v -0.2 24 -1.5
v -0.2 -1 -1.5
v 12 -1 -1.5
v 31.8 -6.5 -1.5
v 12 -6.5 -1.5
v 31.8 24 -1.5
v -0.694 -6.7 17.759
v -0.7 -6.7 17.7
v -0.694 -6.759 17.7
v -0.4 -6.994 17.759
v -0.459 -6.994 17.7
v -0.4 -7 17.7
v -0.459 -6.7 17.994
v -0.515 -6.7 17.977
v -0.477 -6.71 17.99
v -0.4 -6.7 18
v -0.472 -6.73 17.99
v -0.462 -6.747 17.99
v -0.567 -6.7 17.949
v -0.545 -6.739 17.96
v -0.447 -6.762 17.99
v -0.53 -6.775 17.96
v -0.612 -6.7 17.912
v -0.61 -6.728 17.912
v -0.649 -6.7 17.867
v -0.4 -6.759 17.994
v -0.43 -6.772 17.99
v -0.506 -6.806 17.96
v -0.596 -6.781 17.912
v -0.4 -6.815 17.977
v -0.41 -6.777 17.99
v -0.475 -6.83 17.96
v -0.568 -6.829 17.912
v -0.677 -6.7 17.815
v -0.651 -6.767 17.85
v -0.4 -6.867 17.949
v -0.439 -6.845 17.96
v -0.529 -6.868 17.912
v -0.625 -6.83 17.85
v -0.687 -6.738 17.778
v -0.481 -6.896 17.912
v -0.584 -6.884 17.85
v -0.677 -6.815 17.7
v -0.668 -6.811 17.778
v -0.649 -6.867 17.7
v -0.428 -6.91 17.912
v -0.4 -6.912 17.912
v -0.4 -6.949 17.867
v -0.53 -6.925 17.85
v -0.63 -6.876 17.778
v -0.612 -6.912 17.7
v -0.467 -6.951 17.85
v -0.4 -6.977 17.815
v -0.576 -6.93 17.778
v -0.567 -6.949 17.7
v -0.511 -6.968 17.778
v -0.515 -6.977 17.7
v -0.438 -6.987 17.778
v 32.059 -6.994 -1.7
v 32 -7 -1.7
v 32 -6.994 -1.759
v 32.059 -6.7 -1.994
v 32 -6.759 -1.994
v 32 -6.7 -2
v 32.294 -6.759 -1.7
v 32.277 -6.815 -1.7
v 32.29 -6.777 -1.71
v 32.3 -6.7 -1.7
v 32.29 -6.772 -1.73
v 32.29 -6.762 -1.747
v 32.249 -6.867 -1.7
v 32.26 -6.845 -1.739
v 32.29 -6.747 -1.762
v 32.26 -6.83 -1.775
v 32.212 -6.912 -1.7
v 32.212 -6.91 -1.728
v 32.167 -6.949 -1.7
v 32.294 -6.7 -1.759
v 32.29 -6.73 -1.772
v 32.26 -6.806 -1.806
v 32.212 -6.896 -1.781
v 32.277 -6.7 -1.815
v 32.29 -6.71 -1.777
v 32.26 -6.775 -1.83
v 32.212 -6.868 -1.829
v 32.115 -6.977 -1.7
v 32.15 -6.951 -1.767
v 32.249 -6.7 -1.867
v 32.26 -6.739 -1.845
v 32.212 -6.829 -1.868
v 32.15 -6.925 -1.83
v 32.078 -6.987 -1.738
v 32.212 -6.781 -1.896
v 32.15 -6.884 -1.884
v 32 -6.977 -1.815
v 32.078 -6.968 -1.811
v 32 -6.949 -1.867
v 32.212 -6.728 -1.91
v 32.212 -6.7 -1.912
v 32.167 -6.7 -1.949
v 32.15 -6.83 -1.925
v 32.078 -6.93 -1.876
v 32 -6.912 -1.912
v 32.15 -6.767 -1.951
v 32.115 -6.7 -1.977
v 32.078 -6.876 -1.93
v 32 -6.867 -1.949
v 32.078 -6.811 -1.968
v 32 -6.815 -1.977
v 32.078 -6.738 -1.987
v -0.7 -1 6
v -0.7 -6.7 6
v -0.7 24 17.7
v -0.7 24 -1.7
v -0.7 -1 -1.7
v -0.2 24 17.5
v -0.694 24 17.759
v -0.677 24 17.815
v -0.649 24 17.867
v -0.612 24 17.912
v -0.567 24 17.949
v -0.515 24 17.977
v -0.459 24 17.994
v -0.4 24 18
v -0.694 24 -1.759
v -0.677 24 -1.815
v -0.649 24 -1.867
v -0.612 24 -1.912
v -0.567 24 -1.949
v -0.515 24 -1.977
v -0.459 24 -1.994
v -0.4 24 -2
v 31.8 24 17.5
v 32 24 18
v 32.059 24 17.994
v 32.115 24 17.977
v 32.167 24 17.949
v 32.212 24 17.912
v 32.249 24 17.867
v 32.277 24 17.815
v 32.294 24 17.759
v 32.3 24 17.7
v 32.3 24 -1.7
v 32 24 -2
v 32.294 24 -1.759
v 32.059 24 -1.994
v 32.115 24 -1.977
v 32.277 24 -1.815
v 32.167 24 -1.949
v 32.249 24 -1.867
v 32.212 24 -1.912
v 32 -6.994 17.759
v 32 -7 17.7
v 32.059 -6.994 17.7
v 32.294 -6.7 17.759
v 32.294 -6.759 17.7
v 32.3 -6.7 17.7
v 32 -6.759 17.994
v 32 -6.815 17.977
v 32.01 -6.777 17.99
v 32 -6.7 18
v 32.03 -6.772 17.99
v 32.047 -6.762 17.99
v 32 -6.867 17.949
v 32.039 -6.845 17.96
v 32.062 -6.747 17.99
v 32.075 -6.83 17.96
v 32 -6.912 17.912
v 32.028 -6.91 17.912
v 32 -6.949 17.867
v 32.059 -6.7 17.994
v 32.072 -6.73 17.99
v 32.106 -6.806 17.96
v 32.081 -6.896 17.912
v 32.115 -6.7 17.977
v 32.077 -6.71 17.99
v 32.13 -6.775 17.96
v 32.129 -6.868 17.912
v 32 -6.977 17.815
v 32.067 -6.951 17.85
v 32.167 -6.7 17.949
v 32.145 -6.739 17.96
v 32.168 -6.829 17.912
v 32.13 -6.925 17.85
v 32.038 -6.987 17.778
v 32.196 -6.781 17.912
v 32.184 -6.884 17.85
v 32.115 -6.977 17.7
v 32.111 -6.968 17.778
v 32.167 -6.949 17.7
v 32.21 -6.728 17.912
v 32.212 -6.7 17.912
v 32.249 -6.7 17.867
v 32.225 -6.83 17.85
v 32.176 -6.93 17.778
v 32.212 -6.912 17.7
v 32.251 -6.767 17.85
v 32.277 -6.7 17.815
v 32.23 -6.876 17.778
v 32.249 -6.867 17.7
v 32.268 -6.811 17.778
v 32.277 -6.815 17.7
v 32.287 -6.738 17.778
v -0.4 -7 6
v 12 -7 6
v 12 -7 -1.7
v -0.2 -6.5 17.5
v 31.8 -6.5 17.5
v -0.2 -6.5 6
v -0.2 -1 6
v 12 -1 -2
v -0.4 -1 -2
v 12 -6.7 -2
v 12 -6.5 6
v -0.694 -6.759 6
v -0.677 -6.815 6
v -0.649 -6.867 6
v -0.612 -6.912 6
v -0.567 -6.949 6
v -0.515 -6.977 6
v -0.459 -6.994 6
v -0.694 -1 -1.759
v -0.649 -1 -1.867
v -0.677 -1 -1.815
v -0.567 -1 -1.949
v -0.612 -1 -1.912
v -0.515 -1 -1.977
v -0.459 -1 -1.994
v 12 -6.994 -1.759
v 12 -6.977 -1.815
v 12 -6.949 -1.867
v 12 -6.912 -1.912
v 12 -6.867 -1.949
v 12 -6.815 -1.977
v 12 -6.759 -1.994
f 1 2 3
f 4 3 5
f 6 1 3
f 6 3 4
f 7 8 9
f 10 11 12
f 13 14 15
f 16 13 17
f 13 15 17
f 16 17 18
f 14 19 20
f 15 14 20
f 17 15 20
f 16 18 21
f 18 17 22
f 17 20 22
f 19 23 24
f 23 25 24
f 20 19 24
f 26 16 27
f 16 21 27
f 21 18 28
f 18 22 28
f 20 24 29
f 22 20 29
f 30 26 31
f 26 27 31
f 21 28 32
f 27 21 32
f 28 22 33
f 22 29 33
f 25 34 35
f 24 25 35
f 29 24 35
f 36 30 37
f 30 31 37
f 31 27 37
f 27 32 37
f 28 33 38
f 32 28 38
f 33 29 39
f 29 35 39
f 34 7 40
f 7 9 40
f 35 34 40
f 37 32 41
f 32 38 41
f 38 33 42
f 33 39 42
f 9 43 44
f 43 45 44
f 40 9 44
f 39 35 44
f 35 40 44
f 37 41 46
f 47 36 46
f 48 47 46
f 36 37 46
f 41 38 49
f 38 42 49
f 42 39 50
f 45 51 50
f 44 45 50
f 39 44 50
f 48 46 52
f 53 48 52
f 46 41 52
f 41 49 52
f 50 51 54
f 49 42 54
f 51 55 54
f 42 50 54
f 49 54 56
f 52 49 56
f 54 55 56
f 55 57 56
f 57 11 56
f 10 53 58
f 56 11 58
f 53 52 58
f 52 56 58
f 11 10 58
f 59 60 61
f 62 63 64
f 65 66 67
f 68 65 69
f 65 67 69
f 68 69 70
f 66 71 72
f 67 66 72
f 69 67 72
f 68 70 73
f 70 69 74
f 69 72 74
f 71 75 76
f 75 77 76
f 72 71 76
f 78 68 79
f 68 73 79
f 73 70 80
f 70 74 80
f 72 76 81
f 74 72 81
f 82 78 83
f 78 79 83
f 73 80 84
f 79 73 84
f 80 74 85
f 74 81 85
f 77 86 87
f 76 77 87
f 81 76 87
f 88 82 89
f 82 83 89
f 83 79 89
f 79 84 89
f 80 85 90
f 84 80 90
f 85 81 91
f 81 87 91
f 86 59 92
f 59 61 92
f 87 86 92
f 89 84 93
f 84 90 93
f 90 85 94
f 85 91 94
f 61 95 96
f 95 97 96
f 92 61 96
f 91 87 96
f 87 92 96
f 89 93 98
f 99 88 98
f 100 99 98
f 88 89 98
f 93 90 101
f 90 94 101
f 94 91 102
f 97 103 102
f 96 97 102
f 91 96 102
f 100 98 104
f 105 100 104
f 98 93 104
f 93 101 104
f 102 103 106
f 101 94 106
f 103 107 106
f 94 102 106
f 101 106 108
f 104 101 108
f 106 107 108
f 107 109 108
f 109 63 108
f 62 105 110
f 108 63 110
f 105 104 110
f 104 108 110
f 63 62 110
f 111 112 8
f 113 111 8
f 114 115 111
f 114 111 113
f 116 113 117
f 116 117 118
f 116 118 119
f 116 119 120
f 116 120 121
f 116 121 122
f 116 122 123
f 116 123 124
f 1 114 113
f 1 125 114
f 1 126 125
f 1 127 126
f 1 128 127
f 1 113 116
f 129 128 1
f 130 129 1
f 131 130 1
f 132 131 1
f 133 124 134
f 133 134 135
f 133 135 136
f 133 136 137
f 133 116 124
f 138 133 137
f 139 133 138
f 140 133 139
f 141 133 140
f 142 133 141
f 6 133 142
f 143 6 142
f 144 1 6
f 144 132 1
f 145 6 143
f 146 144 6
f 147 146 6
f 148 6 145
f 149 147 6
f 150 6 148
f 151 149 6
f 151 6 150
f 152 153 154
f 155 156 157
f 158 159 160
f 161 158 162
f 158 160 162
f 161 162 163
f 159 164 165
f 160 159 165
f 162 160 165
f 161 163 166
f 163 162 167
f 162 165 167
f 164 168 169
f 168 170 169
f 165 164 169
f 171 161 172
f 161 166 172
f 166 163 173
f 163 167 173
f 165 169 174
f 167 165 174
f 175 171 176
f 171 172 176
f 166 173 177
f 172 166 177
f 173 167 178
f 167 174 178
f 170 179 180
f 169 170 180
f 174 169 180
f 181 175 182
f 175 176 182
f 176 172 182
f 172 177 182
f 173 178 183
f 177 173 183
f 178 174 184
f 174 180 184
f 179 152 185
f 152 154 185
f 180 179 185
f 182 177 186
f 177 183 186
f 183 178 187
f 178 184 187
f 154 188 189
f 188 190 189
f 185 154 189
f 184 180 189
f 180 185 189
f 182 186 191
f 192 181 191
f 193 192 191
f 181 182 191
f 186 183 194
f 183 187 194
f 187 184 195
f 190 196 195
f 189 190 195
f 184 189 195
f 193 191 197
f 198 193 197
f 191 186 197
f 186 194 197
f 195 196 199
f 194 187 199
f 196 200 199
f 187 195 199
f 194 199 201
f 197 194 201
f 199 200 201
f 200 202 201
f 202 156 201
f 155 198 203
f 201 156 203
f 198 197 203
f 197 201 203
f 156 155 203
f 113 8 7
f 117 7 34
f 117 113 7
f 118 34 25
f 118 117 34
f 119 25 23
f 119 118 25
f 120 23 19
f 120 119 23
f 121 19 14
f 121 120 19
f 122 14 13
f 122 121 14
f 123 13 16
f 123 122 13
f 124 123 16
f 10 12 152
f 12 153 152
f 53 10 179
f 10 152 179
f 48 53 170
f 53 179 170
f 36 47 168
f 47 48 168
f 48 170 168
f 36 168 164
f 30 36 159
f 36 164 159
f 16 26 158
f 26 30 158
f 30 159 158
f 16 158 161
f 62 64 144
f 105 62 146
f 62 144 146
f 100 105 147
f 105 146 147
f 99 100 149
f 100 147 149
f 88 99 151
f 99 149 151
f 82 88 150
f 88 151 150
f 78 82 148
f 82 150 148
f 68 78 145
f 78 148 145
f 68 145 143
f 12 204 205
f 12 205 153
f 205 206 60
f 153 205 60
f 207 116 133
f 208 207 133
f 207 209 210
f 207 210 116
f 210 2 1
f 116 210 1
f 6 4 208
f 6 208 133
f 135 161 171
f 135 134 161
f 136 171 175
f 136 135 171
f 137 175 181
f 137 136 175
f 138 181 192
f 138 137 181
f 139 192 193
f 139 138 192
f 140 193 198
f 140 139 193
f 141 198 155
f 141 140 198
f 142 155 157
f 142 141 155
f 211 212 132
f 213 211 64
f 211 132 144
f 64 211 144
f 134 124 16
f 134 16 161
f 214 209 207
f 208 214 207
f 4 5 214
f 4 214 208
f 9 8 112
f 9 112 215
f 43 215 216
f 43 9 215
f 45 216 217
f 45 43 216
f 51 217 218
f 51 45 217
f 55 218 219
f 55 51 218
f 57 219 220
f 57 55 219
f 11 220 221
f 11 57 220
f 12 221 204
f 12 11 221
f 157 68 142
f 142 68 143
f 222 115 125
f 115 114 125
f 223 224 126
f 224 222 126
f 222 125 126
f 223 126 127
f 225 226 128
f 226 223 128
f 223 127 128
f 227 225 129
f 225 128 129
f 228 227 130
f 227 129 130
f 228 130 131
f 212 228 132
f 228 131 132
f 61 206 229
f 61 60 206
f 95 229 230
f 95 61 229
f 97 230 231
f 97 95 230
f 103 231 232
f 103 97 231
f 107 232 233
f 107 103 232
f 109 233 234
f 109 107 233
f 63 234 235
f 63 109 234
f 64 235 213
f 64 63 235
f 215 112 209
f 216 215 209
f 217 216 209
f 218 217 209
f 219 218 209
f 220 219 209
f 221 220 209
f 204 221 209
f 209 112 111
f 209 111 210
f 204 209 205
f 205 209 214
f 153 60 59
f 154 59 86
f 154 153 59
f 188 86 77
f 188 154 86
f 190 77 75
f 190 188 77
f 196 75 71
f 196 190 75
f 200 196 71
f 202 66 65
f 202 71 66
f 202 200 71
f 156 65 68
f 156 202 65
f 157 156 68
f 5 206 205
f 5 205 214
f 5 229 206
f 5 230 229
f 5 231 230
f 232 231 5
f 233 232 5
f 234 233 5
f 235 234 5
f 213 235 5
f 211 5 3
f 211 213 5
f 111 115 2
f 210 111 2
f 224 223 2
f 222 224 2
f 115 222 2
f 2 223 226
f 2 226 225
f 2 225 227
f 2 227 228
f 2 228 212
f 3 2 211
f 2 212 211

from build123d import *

# Parameters (mm, degrees)
BOX012_W     = 14
BOX012_H     = 10
BOX012_DEPTH = 10
BOX011_W     = 32
BOX011_H     = 35
BOX011_DEPTH = 19
BOX010_W     = 33
BOX010_H     = 31
BOX010_DEPTH = 20
FILLET_R     = 0.3


with BuildPart() as cubo001:
    # Box012 → Box012 (new body)
    with BuildSketch(Plane(origin=(-2, -11, -4), x_dir=(1, 0, 0), z_dir=(0, 0, 1))):
        with Locations((7, 5)):
            Rectangle(BOX012_W, BOX012_H)
    extrude(amount=BOX012_DEPTH)


with BuildPart() as cubo:
    # Box011 → Box011 (new body)
    with BuildSketch(Plane(origin=(-0.2, -6.5, -1.5), x_dir=(1, 0, 0), z_dir=(0, 0, 1))):
        with Locations((16, 17.5)):
            Rectangle(BOX011_W, BOX011_H)
    extrude(amount=BOX011_DEPTH)


with BuildPart() as cut001:
    # Box010 → Box010 (new body)
    with BuildSketch(Plane(origin=(-0.7, -7, -2), x_dir=(1, 0, 0), z_dir=(0, 0, 1))):
        with Locations((16.5, 15.5)):
            Rectangle(BOX010_W, BOX010_H)
    extrude(amount=BOX010_DEPTH)

    # Cut: cut Cubo
    add(cubo.part, mode=Mode.SUBTRACT)

    # Fillet
    fillet_edges = [cut001.edges().sort_by_distance(p)[0] for p in [
        (-0.7, -7, 8),
        (-0.7, 8.5, 18),
        (-0.7, 8.5, -2),
        (15.8, -7, -2),
        (32.3, -7, 8),
        (15.8, -7, 18),
        (32.3, 8.5, 18),
        (32.3, 8.5, -2),
    ]]
    fillet(fillet_edges, radius=FILLET_R)

    # Cut001: cut Cubo001
    add(cubo001.part, mode=Mode.SUBTRACT)


solid = cut001.part
